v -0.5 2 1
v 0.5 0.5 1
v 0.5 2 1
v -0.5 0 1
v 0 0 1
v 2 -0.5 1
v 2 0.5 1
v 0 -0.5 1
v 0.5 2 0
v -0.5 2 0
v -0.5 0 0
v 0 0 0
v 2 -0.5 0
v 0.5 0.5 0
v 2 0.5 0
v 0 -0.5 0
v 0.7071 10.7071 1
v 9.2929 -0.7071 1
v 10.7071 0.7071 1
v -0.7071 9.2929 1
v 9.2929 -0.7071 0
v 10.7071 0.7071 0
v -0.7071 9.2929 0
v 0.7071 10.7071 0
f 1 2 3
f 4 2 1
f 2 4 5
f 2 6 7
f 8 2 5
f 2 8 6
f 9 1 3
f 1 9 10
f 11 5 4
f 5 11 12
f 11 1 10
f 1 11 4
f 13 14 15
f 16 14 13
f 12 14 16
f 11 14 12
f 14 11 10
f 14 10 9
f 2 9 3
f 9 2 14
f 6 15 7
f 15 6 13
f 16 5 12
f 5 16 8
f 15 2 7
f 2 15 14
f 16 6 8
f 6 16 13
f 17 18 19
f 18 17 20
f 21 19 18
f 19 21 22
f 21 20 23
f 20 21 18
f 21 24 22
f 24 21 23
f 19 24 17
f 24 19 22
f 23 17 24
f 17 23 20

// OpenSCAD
//Draw a line with given width in XY plane with given height
//in Z direction from point 1 to point 2
module thickLine(pt1=[0,0], pt2=[1,0], width=1, height=1) {
        dist = sqrt(
                (pt1[0]-pt2[0])*(pt1[0]-pt2[0])+
                (pt1[1]-pt2[1])*(pt1[1]-pt2[1]));
        translate([pt1[0],pt1[1],0])
        rotate(atan2(pt2[1]-pt1[1], pt2[0]-pt1[0]))
        translate([0,-width/2,0])
        cube([dist, width, height]);
}

// Testing
echo("##########");
echo("In thickLine.scad");
echo("This file should not be included, use ''use <filemane>'' instead.");
echo("##########");

p=1;
if (p==1){
  thickLine(pt1=[0,0], pt2=[0,2], width=1, height=1);
  thickLine(pt1=[0,0], pt2=[2,0], width=1, height=1);
  thickLine(pt1=[10,0], pt2=[0,10], width=2, height=1);
}
